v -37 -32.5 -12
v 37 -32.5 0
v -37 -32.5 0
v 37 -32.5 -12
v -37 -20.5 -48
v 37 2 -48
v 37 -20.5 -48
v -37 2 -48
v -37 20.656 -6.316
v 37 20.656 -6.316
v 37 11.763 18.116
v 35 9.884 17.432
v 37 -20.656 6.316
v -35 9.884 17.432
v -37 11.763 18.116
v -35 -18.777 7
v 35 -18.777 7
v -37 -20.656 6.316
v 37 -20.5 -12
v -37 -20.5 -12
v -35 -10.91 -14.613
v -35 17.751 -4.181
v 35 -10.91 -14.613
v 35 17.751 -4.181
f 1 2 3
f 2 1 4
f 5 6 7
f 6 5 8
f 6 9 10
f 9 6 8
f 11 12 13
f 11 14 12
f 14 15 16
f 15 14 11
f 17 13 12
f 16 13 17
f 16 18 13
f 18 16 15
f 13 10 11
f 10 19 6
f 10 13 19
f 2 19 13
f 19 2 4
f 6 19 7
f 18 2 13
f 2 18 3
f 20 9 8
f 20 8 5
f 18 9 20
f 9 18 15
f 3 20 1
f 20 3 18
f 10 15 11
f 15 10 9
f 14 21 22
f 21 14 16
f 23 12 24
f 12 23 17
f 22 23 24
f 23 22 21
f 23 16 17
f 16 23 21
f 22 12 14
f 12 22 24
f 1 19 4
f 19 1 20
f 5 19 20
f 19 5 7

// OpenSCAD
inside_base_x = 70.0;
inside_base_y = 30.5;
inside_base_z = 24.0;
crade_push_out = 20;
ledge_indent = 12.0;
tilt = 20;
thickness = 2.0;

outside_base_height_normal = inside_base_z + thickness;
outside_base_height_high = inside_base_z * 2;

module base_cube(high=false) {
    z = high == true ? outside_base_height_high : outside_base_height_normal;
    cube([inside_base_x + thickness * 2,
      inside_base_y + thickness * 2,
      z], center=true);
}

module inside_cube() {
    cube([inside_base_x,
      inside_base_y,
      inside_base_z], center=true);
}

module step() {
    translate([0, -inside_base_y/2, -inside_base_z]) 
        translate([0, -(inside_base_y+2*thickness)/2 + ledge_indent/2, -ledge_indent] )
            cube([inside_base_x + 2*thickness,
                  ledge_indent, 
                  outside_base_height_high], center=true);
}

module cradle() {
    difference() {
        hull() {
            rotate([tilt, 0, 0]) base_cube();
            translate([0, -inside_base_y/2, -inside_base_z]) base_cube(high=true);
        }
        rotate([tilt, 0, 0]) translate([0, 0, thickness]) inside_cube();
    }
   
}

module mount() {
    difference() {
        cradle();
        step();
    }
}

mount();
    
